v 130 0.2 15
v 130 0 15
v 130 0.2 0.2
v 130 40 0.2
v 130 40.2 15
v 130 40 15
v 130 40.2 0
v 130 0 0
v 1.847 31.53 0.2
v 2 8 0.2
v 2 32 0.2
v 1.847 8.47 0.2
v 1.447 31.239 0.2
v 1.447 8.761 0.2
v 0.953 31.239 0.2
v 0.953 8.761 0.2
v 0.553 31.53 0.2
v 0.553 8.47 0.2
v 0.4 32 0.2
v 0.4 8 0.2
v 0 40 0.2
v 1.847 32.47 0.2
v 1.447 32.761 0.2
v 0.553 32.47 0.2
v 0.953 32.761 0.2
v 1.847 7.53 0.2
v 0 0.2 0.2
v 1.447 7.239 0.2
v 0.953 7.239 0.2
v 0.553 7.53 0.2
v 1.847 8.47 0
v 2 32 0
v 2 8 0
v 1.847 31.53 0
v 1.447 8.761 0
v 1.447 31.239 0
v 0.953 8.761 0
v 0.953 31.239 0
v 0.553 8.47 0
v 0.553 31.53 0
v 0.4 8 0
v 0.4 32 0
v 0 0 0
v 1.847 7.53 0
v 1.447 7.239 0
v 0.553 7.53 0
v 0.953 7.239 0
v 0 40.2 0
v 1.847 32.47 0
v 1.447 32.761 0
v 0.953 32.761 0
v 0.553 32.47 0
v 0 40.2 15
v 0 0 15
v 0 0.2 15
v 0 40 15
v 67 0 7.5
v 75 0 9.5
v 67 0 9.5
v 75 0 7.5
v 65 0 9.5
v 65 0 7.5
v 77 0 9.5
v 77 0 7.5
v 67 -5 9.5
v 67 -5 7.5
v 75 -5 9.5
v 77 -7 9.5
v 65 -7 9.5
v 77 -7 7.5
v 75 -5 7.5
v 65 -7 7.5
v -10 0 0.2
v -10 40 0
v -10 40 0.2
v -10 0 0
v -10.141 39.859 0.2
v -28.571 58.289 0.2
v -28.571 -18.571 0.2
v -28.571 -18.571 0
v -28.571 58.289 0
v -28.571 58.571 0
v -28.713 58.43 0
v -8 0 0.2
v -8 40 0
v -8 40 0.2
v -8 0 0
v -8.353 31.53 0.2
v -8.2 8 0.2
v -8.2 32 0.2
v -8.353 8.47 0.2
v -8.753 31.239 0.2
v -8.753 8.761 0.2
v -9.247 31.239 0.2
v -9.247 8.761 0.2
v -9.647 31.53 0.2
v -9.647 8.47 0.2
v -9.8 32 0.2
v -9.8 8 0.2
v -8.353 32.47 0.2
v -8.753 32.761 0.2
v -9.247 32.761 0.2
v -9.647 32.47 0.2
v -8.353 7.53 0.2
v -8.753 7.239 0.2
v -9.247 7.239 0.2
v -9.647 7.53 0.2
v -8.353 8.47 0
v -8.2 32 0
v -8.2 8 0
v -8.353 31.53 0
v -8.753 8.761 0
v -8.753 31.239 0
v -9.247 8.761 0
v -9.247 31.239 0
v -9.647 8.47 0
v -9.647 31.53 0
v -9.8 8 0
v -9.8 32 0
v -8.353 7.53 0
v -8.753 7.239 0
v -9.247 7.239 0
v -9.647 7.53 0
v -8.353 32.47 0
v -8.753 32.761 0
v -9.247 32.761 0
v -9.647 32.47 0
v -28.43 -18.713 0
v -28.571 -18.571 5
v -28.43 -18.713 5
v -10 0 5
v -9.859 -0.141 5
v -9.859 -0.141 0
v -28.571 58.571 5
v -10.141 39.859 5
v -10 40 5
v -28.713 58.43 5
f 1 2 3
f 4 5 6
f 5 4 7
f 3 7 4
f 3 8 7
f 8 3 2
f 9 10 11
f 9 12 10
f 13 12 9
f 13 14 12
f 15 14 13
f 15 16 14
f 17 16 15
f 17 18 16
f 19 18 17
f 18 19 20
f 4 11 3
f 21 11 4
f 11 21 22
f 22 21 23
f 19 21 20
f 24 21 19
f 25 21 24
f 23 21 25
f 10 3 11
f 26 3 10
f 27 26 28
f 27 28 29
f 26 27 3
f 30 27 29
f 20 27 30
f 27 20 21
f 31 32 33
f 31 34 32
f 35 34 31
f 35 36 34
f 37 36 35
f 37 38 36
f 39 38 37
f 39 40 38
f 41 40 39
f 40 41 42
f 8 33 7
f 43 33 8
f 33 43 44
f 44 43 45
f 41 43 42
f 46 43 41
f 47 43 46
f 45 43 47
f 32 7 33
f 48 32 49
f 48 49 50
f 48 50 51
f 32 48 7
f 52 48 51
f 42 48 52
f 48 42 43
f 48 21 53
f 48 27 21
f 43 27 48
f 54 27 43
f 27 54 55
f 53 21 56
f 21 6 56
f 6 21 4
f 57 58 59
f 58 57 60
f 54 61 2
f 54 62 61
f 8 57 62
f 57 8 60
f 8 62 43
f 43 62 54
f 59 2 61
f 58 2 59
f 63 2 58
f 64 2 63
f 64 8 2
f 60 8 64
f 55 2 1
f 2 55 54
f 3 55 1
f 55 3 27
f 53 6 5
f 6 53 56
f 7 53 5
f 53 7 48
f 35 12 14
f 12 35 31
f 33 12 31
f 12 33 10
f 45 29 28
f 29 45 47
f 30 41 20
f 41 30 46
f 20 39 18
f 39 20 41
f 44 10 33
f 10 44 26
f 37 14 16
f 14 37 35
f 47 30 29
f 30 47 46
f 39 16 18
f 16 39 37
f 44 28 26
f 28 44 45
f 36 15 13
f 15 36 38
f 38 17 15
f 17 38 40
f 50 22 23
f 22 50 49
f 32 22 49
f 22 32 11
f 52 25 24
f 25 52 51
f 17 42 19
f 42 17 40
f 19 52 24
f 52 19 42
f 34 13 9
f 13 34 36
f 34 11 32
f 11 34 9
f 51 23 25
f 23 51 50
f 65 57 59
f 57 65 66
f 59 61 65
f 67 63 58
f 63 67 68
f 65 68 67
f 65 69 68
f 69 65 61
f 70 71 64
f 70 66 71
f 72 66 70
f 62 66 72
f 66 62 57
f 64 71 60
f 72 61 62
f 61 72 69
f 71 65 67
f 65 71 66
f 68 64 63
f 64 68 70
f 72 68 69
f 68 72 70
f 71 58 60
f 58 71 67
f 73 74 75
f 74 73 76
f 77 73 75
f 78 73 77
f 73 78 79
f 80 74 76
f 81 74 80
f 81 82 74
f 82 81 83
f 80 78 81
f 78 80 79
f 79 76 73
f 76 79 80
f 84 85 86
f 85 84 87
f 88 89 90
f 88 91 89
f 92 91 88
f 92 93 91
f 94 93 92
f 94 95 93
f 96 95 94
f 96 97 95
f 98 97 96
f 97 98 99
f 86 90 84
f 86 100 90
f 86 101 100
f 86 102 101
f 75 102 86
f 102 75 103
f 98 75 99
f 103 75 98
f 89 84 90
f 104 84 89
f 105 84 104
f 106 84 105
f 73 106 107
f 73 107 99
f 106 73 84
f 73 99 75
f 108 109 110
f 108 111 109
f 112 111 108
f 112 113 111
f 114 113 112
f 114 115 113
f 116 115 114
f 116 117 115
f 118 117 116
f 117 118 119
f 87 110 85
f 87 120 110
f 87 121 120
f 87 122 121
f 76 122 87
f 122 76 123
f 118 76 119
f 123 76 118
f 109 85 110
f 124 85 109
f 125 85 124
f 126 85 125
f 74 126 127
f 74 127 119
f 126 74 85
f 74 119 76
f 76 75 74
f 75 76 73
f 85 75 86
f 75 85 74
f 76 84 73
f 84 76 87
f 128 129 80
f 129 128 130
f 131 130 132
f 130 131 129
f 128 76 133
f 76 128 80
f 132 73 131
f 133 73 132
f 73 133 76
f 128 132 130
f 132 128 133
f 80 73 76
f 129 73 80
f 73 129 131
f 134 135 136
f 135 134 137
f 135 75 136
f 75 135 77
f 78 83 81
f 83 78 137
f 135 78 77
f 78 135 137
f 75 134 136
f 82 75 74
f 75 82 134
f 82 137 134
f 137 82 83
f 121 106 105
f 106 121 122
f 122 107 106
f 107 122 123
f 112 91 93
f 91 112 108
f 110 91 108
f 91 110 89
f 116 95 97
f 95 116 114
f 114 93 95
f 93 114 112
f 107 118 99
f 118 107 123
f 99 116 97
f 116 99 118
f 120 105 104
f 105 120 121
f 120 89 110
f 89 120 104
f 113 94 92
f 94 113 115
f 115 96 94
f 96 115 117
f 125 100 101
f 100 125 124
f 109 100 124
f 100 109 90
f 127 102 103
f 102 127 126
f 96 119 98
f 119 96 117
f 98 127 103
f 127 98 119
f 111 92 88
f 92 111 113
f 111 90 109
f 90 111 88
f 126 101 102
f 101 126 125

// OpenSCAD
/*
	/dev/sluice - (c) psicom
	config = "river" | "highbanker"
*/
sluice(130,40,15,.2, "river");

// sluiceconfig
module sluice(length, width, height, thick, config){
	color("silver"){
		union(){
			// sluice base
			sluicebase(length, width, height, thick)
			echo(config);
			if (config == "highbanker"){
				translate([0,thick,height/2]) bankerextension(length/1.5, width-thick, height*2, thick);
				venturisucker();
			}
			else{
				translate([-10,0,0]) riverextension(length/7, height/3, thick, width);
			}
		}
	}
}

// modules
module sluicebase(length, width, height, thick){	
	union(){
		difference(){
			// U form
			union(){
				cube([length,width,thick]);
				cube([length,thick,height]);
				translate([0,width,0]) cube([length,thick,height]);
			}
			// adaptorholes
			union(){	
				translate([1.2, width/10*2,-4]) cylinder(h=10, r=.8, $fn=10);
				translate([1.2, width/10*8,-4]) cylinder(h=10, r=.8, $fn=10);
			}
		}
		// handle
		translate([length/2, -5, height/2]) union(){
			cube([2,5,2]);
			translate([0,-2,0]) cube([12,2,2]);
			translate([10,0,0]) cube([2,5,2]);
		}
	}
}

module inlayandmoss(){
}

module standingfeet(){
}

module riverextension(length, height, thick, width){
	difference(){
		union(){
			cube([2, width, thick]);
			rotate([0,0,-135]) cube([length/cos(45), thick, height]);
			translate([0,width,0]) rotate([0,0,135]) cube([length/cos(45), thick, height]);
			translate([-length,0,0]){
				cube([length, width, thick]);
				mirror([0,1,0]){
					linear_extrude(height = thick, center = false, convexity = thick, twist = 0)
					polygon(points=[[0,0],[length,0],[0,length]], paths=[[0,1,2]]);
				}
				translate([0,width,0]){
					linear_extrude(height = thick, center = false, convexity = thick, twist = 0)
					polygon(points=[[0,0],[length,0],[0,length]], paths=[[0,1,2]]);
				}
			}
		}
		// adaptorholes
		union(){	
				translate([1, width/10*2,-4]) cylinder(h=10, r=.8, $fn=10);
				translate([1, width/10*8,-4]) cylinder(h=10, r=.8, $fn=10);
		}
	}
}

module bankerextension(length, width, height, thick, hole){
	rotate(a=30, v=[0,-1,0]) {
		translate([0,0,0]) {
			color("silver"){
				union(){
					union(){
						// backplane
						translate([0,0,height/3]) cube([thick, width, height/3*2]);
						// oberer Boden
						translate([length/2,0,0]){
							cube([length/2,width,thick]);
							translate([0,0,height/2]){
								difference(){
   								cube([thick, width, height/2]);
   								rotate ([0,90,0]) translate([-height/4,width/2,-0.01]) 
										cylinder ( h = thick+0.02, r=3, $fn=100);
								}
							}
						}
					}
					cube([length,thick,height]);
					translate([0,width,0]) cube([length,thick,height]);
					translate([length,0,0]) cube([thick, width, height]);
				}
				// grid
				for (x = [0 : 4 : 40]){
    				translate([x, 0, 0])	cube([2, width, thick]);
				}
			}
		}
	}
}

module venturisucker(){

}


// helperfoo

module prism(l, w, h) {
	translate([0, l, 0]) rotate( a= [90, 0, 0])
	linear_extrude(height = l) polygon(points = [
		[0, 0],
		[w, 0],
		[0, h]], paths=[[0,1,2,0]]);
}
